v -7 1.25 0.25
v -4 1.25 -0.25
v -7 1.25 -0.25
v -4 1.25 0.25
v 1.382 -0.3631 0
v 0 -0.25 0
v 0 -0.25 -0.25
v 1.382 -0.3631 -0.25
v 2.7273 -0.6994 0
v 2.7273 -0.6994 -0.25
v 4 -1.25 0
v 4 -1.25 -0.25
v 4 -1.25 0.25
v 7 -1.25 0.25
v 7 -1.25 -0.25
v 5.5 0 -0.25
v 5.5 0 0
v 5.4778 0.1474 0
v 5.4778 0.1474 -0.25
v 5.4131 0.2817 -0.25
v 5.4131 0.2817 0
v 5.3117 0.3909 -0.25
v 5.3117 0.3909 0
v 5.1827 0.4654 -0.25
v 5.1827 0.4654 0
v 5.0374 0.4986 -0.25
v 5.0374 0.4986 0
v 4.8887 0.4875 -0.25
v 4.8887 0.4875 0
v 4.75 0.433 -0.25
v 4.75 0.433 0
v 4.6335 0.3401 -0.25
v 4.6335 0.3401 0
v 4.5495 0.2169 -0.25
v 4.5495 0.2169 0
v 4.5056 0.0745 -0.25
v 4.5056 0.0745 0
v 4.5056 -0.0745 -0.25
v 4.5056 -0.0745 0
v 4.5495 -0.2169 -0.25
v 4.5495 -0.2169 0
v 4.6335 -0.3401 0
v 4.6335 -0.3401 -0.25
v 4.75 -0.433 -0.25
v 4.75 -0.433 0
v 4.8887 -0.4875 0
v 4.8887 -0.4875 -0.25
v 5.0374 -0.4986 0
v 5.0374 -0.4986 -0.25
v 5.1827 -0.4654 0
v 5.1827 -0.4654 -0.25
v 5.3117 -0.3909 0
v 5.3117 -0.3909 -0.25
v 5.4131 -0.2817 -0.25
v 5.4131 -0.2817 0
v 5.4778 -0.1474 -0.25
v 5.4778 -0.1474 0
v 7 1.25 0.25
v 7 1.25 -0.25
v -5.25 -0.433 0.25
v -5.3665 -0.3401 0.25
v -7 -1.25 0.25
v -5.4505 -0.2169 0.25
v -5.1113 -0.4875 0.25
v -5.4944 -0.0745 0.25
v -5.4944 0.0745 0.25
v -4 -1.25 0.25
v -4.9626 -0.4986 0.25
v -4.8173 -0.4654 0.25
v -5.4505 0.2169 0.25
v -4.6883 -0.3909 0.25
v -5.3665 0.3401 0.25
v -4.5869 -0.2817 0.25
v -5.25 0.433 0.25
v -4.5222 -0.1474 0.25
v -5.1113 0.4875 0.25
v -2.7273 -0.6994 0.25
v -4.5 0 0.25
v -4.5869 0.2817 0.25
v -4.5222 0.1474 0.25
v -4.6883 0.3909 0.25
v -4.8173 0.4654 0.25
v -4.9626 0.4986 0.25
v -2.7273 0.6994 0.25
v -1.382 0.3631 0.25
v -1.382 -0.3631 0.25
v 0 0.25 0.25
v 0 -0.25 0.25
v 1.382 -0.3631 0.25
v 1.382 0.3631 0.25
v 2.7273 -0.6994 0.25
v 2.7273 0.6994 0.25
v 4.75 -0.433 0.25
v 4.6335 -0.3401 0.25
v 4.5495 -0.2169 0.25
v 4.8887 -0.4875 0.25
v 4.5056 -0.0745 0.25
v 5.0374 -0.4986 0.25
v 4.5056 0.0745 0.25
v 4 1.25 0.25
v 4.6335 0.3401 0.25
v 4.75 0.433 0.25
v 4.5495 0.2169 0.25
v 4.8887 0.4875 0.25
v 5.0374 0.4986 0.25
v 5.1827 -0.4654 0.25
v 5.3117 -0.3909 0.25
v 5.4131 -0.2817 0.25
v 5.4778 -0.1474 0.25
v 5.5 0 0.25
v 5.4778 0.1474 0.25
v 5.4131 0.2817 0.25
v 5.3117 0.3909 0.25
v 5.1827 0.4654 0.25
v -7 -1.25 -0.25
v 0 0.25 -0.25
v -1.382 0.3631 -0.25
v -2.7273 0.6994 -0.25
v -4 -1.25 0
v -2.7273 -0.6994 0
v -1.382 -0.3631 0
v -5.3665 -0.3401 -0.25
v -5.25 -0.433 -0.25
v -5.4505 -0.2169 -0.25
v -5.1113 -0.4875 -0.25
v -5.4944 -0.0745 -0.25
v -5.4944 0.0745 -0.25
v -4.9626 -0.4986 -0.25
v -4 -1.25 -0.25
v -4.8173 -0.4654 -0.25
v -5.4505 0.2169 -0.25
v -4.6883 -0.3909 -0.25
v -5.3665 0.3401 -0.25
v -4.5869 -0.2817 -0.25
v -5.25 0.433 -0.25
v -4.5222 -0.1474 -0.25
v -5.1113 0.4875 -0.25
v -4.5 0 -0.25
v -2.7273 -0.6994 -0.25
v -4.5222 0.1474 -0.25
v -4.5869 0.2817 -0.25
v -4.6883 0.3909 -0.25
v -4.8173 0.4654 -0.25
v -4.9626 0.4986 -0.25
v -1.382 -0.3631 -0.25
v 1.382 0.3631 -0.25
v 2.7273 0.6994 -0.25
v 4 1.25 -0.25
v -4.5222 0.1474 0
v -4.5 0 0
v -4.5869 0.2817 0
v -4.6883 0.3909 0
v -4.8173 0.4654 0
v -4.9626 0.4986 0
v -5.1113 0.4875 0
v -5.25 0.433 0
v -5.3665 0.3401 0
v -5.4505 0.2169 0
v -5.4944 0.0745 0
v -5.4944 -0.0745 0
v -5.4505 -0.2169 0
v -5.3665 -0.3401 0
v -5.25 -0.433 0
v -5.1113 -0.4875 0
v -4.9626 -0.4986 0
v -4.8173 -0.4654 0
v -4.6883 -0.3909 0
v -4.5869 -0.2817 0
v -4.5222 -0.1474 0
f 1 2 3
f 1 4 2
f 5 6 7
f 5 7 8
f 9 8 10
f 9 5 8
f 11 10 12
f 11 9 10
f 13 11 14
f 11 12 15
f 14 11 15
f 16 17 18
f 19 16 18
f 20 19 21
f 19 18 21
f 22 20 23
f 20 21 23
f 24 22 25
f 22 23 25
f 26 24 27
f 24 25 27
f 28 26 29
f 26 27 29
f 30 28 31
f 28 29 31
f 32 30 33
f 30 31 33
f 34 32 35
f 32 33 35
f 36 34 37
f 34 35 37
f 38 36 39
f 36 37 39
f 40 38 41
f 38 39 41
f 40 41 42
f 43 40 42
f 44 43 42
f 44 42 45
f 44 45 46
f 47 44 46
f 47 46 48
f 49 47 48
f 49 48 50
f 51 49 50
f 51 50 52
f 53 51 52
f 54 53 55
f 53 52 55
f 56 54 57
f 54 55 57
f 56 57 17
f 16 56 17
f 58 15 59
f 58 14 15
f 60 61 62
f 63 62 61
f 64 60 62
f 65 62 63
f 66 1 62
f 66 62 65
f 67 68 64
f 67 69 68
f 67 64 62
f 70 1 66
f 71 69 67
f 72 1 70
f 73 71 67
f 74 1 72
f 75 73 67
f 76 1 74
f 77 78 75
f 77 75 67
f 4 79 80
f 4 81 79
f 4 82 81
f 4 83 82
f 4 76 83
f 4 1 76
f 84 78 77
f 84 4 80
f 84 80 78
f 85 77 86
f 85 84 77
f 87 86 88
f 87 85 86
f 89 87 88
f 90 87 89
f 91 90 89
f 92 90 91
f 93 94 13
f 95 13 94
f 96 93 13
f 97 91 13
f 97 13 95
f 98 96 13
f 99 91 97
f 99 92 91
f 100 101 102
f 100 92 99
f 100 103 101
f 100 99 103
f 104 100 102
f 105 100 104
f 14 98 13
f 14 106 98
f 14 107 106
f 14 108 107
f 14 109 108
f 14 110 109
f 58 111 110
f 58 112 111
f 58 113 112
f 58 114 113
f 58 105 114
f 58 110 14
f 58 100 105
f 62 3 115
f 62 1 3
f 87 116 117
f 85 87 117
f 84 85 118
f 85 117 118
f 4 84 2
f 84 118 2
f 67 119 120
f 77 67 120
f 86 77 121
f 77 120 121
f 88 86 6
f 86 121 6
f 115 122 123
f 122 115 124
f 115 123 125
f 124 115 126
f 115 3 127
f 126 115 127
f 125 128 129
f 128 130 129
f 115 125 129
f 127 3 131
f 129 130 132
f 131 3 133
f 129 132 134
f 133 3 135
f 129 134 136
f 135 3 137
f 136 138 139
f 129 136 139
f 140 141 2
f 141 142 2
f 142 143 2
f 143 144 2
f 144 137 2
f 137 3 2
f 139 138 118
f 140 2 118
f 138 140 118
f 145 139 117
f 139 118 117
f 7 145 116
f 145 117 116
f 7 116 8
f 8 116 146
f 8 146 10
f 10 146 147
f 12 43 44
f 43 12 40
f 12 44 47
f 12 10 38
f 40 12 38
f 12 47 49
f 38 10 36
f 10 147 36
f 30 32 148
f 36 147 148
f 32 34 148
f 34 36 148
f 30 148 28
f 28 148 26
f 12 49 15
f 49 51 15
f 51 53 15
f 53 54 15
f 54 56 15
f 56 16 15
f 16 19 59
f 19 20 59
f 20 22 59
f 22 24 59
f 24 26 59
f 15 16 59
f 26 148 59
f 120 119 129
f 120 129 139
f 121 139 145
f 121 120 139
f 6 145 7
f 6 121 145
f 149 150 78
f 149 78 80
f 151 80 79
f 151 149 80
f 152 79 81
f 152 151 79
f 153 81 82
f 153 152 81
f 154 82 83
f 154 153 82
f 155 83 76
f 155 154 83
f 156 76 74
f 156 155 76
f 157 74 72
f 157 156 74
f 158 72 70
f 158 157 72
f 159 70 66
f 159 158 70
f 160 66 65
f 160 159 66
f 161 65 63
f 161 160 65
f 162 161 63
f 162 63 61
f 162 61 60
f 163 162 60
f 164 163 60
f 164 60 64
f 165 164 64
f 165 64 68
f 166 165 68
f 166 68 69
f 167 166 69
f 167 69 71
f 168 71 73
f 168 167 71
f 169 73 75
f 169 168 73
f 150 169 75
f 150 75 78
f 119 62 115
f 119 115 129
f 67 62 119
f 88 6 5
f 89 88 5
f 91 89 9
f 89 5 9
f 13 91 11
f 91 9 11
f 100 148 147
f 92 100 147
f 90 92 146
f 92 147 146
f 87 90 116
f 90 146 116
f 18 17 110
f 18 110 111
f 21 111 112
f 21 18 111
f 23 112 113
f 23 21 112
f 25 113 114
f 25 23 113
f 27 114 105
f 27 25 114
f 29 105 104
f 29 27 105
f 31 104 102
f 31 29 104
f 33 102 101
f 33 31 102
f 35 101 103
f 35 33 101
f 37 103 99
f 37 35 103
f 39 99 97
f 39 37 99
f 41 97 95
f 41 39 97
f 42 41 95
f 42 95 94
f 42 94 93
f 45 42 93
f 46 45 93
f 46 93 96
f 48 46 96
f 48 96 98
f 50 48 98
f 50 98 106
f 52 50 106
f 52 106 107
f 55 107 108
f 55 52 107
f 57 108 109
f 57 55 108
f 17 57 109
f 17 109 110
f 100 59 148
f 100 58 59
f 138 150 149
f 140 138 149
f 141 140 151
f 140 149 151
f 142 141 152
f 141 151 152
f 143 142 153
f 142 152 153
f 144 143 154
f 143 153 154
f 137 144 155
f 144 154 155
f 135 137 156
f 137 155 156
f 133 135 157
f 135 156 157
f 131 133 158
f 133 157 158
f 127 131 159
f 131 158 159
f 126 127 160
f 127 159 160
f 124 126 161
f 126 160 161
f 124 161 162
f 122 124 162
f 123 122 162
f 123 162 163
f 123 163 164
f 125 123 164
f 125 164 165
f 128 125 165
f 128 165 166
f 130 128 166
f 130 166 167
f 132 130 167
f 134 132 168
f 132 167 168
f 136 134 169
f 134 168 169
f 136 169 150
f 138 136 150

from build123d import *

# Parameters (mm, degrees)
F0_R     = 0.5
F1_DEPTH = 0.25


with BuildPart() as f1:
    # F0 (on Top) → F1 (new body, symmetric)
    with BuildSketch(Plane.XY):
        with BuildLine():
            Line((-7, 1.25), (-7, 0))
            Line((-7, 0), (-7, -1.25))
            Line((-7, -1.25), (-4, -1.25))
            ThreePointArc((-4, -1.25), (-2.0615528128, -0.5037887488), (0, -0.25))
            ThreePointArc((0, -0.25), (2.0615528128, -0.5037887488), (4, -1.25))
            Line((4, -1.25), (7, -1.25))
            Line((7, -1.25), (7, 0))
            Line((7, 0), (7, 1.25))
            Line((7, 1.25), (4, 1.25))
            ThreePointArc((4, 1.25), (2.0615528128, 0.5037887488), (0, 0.25))
            ThreePointArc((0, 0.25), (-2.0615528128, 0.5037887488), (-4, 1.25))
            Line((-4, 1.25), (-7, 1.25))
        make_face()
        with Locations((-5, 0)):
            Circle(F0_R, mode=Mode.SUBTRACT)
        with Locations((5, 0)):
            Circle(F0_R, mode=Mode.SUBTRACT)
    extrude(amount=F1_DEPTH, both=True)


solid = f1.part
